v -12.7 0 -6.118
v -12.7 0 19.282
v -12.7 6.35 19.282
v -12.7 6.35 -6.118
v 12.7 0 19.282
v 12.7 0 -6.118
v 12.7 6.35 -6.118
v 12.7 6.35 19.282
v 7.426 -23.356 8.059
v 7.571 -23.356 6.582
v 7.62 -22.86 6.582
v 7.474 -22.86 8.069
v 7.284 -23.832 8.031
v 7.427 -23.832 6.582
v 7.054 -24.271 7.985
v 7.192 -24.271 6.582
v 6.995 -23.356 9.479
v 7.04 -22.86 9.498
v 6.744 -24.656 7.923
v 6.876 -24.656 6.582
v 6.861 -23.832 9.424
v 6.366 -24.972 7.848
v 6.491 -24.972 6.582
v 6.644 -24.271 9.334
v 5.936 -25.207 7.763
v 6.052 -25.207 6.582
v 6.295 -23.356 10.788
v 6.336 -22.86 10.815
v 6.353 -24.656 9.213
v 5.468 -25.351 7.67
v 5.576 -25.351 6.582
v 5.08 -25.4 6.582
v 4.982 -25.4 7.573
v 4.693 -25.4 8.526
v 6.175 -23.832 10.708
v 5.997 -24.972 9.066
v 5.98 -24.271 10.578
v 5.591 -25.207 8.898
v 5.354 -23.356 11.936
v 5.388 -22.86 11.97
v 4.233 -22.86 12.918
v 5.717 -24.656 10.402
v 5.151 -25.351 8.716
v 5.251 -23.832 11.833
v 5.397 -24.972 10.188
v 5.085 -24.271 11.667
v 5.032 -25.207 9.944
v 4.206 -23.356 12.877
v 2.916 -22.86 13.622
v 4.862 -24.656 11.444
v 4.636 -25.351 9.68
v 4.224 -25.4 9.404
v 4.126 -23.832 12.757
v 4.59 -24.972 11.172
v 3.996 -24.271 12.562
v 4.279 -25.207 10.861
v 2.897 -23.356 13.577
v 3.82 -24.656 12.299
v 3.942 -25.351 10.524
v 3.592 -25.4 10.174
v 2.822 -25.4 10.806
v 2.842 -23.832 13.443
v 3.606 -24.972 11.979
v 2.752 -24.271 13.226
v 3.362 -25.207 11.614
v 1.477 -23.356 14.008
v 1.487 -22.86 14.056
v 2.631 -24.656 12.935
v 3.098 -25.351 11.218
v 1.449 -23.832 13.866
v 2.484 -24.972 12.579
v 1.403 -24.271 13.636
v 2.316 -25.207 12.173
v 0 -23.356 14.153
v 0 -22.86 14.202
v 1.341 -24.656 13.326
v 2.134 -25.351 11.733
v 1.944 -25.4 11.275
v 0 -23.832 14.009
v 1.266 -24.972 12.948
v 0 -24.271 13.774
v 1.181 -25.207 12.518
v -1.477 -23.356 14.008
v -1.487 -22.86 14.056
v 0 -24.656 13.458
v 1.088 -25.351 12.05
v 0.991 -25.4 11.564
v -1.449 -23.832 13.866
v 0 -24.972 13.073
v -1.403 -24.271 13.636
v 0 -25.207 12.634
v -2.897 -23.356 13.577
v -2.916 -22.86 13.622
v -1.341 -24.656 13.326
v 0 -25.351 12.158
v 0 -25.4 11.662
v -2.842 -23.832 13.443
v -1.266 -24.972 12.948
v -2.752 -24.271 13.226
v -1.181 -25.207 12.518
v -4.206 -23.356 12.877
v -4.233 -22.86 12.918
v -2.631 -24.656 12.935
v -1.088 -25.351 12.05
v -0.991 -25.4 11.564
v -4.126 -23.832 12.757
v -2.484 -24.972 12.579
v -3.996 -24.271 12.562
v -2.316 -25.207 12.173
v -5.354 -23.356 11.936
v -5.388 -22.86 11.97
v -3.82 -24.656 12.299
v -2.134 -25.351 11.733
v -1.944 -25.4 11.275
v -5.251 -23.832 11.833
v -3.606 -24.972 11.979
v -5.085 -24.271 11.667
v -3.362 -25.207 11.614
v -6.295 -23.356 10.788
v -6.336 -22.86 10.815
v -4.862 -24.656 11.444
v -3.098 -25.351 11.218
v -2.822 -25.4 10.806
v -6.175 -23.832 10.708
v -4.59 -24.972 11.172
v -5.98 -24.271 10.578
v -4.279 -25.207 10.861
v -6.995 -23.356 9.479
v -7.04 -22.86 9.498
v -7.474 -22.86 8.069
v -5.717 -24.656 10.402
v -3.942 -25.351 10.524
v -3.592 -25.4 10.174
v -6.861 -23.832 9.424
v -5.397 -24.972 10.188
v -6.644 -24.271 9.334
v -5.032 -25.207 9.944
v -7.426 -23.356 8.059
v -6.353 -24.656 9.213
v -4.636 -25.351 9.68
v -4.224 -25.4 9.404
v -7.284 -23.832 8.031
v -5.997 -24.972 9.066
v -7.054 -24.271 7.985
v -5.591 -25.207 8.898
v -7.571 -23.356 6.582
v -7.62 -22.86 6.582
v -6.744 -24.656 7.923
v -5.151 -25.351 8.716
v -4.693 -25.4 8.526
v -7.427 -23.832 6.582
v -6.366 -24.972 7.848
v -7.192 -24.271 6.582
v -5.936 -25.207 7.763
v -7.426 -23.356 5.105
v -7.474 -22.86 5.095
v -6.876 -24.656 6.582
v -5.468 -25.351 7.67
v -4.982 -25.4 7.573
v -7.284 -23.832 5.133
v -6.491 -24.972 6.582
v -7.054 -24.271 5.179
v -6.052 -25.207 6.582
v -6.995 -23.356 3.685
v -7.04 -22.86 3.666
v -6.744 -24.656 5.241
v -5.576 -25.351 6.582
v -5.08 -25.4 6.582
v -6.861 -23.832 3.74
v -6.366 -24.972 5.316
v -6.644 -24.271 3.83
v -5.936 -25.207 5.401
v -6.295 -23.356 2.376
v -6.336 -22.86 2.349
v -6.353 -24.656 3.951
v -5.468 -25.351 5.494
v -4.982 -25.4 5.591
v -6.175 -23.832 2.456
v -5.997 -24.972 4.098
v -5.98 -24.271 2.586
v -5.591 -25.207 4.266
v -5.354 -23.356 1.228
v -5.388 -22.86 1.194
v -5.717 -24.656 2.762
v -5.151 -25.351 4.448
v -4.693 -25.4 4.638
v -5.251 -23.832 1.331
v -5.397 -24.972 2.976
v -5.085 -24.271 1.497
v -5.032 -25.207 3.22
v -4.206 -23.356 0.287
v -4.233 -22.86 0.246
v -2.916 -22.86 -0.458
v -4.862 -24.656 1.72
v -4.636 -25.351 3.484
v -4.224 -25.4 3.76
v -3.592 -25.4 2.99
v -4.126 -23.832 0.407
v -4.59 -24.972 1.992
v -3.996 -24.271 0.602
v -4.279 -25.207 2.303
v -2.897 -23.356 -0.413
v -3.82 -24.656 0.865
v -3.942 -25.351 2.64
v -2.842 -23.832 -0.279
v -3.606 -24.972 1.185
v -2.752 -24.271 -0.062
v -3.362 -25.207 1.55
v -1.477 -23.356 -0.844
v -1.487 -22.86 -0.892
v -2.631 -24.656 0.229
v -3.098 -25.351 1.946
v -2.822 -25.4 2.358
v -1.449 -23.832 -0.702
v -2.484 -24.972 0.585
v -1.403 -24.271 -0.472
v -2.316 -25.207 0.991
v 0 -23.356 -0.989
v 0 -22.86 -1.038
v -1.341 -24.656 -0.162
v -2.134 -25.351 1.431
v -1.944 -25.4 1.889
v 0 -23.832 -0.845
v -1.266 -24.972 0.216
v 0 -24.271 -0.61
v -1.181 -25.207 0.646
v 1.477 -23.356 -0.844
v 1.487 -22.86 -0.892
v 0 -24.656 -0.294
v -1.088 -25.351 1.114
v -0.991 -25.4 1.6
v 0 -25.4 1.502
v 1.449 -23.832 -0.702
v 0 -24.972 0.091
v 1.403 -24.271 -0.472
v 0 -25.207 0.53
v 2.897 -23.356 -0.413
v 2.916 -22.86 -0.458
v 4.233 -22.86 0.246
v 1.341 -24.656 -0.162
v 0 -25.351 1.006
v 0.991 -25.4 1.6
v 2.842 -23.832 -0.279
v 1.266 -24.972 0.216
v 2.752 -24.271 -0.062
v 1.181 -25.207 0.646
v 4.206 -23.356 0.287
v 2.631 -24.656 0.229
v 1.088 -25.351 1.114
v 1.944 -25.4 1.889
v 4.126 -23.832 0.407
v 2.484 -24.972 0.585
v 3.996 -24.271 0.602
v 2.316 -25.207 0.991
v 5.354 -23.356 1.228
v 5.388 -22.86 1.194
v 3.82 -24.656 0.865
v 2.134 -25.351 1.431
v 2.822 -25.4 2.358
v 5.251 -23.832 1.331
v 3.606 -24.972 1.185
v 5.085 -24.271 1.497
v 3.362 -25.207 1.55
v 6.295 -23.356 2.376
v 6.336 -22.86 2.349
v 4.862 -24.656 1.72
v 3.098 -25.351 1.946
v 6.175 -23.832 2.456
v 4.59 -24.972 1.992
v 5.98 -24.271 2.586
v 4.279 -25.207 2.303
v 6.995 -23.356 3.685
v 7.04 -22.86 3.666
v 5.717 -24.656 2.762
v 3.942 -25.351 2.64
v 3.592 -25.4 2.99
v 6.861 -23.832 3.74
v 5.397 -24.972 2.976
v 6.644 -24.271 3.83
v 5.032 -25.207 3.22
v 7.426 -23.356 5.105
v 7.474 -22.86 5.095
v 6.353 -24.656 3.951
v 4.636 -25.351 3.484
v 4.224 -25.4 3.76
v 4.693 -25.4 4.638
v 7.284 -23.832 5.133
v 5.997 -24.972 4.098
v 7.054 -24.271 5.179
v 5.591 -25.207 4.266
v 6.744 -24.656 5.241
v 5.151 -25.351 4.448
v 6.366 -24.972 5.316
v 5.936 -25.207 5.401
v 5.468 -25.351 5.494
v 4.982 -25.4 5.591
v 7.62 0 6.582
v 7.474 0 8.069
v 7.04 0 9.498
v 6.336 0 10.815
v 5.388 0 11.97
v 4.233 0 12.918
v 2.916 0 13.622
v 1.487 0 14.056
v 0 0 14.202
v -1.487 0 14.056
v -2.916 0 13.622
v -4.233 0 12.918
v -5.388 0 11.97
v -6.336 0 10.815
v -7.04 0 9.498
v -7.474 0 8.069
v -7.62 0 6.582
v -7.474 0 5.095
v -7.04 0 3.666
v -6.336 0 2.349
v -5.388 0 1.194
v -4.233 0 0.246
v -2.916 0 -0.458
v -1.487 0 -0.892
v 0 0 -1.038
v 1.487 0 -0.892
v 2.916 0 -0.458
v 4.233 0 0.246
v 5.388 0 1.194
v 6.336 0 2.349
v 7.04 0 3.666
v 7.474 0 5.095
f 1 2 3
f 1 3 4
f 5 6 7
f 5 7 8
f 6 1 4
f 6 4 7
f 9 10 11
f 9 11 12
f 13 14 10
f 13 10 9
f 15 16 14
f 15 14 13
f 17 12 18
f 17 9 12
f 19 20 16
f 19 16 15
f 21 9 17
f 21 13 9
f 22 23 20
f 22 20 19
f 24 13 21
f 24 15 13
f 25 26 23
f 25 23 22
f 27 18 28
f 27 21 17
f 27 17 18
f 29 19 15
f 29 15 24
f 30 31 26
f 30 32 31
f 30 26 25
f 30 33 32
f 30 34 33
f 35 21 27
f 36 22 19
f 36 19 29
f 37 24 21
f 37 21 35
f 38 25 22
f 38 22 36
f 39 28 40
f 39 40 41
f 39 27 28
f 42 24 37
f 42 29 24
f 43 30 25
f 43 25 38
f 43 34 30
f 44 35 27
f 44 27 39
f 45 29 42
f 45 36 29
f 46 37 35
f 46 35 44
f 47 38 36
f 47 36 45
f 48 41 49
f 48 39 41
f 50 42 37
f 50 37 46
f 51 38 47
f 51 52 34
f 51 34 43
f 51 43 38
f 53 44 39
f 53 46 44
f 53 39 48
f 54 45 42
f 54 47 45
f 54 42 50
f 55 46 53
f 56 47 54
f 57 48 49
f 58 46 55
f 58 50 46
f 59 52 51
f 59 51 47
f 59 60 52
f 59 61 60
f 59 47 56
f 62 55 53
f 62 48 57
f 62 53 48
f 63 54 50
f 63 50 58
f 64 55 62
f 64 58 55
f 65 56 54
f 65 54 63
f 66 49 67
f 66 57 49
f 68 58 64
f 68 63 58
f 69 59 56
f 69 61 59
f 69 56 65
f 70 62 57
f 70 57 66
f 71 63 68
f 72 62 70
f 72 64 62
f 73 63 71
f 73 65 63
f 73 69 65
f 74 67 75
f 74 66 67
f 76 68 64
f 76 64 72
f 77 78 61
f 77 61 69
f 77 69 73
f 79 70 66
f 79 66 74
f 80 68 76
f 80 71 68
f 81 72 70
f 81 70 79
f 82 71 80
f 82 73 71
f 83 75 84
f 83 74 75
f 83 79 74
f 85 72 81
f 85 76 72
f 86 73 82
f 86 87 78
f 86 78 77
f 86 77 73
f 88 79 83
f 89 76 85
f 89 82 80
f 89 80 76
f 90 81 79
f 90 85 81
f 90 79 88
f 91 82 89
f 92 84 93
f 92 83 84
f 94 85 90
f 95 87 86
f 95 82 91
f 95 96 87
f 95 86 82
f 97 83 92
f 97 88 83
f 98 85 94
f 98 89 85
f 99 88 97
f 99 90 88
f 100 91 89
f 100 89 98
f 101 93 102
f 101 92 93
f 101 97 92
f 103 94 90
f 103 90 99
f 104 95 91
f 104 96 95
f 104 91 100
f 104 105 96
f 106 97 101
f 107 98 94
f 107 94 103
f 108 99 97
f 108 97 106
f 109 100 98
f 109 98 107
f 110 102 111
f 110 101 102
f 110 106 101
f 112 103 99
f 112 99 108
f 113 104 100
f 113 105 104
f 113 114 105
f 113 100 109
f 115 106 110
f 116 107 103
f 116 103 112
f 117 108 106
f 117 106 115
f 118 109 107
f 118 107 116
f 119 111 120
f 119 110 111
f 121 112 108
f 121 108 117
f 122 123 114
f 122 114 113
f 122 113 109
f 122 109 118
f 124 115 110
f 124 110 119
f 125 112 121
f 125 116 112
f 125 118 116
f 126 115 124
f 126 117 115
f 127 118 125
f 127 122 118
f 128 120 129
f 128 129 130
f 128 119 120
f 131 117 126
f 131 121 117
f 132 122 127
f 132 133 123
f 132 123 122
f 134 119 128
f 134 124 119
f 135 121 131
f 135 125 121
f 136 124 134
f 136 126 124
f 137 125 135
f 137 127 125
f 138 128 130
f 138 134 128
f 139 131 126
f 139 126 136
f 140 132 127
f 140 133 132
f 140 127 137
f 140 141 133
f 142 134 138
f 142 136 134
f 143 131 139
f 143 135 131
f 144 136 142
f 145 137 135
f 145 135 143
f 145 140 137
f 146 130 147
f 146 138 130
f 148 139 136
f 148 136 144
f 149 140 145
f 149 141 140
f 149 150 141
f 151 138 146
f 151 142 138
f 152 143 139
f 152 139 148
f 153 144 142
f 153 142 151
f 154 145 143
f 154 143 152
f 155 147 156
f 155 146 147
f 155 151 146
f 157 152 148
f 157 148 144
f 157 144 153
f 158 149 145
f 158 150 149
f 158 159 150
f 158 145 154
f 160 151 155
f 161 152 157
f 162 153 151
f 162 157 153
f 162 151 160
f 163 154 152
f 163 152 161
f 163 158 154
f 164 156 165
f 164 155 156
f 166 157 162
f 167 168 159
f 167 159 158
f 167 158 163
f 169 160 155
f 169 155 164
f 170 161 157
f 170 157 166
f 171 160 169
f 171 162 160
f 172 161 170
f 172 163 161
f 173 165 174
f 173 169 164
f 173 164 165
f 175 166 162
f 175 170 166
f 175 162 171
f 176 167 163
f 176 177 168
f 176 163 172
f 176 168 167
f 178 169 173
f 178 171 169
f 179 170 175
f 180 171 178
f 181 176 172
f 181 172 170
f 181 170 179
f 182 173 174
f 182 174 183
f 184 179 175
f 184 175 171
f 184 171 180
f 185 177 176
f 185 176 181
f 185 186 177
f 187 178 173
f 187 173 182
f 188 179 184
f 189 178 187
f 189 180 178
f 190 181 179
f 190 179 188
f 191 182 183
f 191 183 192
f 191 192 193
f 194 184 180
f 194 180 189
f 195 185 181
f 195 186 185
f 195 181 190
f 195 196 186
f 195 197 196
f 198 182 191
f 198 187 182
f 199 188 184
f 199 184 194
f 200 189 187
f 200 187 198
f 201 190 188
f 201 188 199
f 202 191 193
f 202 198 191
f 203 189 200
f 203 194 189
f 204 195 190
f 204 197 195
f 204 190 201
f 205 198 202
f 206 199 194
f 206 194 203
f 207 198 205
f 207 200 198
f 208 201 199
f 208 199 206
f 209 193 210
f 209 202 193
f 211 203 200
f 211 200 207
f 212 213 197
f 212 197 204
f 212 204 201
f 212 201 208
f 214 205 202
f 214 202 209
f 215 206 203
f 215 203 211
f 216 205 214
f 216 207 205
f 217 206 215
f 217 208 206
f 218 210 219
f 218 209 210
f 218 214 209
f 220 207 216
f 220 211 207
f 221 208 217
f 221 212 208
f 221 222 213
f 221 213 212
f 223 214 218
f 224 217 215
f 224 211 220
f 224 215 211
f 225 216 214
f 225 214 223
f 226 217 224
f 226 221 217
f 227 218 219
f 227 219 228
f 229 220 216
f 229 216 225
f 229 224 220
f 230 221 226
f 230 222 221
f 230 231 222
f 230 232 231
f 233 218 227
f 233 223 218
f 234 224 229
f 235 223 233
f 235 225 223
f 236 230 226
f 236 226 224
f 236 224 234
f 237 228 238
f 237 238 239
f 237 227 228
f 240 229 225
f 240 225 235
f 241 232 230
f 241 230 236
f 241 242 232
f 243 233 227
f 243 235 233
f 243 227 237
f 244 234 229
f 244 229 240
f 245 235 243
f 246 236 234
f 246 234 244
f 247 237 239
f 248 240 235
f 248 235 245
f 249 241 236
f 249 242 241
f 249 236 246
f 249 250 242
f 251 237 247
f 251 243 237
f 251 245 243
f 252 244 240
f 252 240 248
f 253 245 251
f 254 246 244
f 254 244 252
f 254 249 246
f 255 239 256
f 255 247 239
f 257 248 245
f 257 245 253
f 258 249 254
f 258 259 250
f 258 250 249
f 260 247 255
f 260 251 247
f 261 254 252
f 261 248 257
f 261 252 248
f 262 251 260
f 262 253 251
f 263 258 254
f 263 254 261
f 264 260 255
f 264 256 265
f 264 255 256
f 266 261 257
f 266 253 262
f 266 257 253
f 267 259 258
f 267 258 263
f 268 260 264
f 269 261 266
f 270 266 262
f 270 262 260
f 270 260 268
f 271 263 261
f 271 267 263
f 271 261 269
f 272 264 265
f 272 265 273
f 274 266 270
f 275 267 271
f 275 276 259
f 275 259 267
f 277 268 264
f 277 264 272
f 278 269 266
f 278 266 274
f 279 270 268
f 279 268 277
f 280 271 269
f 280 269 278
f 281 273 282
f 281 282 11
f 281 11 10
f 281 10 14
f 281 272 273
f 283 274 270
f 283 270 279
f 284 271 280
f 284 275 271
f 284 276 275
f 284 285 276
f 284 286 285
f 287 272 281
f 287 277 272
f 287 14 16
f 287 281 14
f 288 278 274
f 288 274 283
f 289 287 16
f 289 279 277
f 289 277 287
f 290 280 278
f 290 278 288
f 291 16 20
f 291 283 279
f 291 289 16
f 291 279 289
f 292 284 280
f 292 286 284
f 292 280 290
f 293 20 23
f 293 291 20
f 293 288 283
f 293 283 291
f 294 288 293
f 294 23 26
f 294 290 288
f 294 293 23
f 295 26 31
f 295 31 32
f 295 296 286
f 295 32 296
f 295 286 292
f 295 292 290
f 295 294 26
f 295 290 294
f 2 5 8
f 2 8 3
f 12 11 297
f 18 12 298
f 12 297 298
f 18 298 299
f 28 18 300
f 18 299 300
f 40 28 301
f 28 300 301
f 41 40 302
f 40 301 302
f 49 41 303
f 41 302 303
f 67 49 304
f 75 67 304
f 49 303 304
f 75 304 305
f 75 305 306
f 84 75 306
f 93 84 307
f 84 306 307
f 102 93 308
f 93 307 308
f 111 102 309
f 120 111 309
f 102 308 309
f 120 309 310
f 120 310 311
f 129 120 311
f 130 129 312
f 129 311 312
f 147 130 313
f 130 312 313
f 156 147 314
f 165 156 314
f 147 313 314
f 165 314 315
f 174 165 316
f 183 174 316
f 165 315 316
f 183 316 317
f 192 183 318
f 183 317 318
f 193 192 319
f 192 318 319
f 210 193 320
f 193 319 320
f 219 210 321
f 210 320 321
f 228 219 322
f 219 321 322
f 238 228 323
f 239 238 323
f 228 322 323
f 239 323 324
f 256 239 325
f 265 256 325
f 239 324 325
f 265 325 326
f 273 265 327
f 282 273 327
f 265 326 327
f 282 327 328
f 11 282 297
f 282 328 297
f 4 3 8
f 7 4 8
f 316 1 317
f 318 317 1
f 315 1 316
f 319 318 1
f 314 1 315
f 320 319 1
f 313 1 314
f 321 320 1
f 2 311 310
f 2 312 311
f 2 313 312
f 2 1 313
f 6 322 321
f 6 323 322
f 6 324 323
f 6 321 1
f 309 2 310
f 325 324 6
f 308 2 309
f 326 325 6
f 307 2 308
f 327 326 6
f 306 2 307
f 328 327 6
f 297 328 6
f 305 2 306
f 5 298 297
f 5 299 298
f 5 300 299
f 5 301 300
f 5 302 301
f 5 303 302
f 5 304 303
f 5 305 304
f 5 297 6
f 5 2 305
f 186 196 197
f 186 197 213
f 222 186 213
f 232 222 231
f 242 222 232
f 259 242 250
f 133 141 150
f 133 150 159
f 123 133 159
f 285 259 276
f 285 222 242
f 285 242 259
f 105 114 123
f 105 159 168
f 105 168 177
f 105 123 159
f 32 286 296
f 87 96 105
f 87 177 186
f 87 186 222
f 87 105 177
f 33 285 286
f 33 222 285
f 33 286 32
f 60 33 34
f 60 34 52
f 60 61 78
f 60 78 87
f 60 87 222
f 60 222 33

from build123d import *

# Parameters (mm, degrees)
F0_R     = 7.62
F1_DEPTH = 25.4
F2_R     = 2.54
F4_DEPTH = 6.35


with BuildPart() as f1:
    # F0 (on Front) → F1 (new body)
    with BuildSketch(Plane.XZ):
        with Locations((0, 6.581996)):
            Circle(F0_R)
    extrude(amount=F1_DEPTH)

    # F2
    f2_edges = [f1.edges().sort_by_distance(p)[0] for p in [
        (-7.62, -25.4, 6.581996),
    ]]
    fillet(f2_edges, radius=F2_R)

    # F3 (on Front) → F4 (join)
    with BuildSketch(Plane.XZ):
        Polygon((-12.7, 19.281996), (-12.7, 15.119903), (-12.7, -6.118004), (12.7, -6.118004), (12.7, 19.281996), align=None)
    extrude(amount=-F4_DEPTH)


solid = f1.part
